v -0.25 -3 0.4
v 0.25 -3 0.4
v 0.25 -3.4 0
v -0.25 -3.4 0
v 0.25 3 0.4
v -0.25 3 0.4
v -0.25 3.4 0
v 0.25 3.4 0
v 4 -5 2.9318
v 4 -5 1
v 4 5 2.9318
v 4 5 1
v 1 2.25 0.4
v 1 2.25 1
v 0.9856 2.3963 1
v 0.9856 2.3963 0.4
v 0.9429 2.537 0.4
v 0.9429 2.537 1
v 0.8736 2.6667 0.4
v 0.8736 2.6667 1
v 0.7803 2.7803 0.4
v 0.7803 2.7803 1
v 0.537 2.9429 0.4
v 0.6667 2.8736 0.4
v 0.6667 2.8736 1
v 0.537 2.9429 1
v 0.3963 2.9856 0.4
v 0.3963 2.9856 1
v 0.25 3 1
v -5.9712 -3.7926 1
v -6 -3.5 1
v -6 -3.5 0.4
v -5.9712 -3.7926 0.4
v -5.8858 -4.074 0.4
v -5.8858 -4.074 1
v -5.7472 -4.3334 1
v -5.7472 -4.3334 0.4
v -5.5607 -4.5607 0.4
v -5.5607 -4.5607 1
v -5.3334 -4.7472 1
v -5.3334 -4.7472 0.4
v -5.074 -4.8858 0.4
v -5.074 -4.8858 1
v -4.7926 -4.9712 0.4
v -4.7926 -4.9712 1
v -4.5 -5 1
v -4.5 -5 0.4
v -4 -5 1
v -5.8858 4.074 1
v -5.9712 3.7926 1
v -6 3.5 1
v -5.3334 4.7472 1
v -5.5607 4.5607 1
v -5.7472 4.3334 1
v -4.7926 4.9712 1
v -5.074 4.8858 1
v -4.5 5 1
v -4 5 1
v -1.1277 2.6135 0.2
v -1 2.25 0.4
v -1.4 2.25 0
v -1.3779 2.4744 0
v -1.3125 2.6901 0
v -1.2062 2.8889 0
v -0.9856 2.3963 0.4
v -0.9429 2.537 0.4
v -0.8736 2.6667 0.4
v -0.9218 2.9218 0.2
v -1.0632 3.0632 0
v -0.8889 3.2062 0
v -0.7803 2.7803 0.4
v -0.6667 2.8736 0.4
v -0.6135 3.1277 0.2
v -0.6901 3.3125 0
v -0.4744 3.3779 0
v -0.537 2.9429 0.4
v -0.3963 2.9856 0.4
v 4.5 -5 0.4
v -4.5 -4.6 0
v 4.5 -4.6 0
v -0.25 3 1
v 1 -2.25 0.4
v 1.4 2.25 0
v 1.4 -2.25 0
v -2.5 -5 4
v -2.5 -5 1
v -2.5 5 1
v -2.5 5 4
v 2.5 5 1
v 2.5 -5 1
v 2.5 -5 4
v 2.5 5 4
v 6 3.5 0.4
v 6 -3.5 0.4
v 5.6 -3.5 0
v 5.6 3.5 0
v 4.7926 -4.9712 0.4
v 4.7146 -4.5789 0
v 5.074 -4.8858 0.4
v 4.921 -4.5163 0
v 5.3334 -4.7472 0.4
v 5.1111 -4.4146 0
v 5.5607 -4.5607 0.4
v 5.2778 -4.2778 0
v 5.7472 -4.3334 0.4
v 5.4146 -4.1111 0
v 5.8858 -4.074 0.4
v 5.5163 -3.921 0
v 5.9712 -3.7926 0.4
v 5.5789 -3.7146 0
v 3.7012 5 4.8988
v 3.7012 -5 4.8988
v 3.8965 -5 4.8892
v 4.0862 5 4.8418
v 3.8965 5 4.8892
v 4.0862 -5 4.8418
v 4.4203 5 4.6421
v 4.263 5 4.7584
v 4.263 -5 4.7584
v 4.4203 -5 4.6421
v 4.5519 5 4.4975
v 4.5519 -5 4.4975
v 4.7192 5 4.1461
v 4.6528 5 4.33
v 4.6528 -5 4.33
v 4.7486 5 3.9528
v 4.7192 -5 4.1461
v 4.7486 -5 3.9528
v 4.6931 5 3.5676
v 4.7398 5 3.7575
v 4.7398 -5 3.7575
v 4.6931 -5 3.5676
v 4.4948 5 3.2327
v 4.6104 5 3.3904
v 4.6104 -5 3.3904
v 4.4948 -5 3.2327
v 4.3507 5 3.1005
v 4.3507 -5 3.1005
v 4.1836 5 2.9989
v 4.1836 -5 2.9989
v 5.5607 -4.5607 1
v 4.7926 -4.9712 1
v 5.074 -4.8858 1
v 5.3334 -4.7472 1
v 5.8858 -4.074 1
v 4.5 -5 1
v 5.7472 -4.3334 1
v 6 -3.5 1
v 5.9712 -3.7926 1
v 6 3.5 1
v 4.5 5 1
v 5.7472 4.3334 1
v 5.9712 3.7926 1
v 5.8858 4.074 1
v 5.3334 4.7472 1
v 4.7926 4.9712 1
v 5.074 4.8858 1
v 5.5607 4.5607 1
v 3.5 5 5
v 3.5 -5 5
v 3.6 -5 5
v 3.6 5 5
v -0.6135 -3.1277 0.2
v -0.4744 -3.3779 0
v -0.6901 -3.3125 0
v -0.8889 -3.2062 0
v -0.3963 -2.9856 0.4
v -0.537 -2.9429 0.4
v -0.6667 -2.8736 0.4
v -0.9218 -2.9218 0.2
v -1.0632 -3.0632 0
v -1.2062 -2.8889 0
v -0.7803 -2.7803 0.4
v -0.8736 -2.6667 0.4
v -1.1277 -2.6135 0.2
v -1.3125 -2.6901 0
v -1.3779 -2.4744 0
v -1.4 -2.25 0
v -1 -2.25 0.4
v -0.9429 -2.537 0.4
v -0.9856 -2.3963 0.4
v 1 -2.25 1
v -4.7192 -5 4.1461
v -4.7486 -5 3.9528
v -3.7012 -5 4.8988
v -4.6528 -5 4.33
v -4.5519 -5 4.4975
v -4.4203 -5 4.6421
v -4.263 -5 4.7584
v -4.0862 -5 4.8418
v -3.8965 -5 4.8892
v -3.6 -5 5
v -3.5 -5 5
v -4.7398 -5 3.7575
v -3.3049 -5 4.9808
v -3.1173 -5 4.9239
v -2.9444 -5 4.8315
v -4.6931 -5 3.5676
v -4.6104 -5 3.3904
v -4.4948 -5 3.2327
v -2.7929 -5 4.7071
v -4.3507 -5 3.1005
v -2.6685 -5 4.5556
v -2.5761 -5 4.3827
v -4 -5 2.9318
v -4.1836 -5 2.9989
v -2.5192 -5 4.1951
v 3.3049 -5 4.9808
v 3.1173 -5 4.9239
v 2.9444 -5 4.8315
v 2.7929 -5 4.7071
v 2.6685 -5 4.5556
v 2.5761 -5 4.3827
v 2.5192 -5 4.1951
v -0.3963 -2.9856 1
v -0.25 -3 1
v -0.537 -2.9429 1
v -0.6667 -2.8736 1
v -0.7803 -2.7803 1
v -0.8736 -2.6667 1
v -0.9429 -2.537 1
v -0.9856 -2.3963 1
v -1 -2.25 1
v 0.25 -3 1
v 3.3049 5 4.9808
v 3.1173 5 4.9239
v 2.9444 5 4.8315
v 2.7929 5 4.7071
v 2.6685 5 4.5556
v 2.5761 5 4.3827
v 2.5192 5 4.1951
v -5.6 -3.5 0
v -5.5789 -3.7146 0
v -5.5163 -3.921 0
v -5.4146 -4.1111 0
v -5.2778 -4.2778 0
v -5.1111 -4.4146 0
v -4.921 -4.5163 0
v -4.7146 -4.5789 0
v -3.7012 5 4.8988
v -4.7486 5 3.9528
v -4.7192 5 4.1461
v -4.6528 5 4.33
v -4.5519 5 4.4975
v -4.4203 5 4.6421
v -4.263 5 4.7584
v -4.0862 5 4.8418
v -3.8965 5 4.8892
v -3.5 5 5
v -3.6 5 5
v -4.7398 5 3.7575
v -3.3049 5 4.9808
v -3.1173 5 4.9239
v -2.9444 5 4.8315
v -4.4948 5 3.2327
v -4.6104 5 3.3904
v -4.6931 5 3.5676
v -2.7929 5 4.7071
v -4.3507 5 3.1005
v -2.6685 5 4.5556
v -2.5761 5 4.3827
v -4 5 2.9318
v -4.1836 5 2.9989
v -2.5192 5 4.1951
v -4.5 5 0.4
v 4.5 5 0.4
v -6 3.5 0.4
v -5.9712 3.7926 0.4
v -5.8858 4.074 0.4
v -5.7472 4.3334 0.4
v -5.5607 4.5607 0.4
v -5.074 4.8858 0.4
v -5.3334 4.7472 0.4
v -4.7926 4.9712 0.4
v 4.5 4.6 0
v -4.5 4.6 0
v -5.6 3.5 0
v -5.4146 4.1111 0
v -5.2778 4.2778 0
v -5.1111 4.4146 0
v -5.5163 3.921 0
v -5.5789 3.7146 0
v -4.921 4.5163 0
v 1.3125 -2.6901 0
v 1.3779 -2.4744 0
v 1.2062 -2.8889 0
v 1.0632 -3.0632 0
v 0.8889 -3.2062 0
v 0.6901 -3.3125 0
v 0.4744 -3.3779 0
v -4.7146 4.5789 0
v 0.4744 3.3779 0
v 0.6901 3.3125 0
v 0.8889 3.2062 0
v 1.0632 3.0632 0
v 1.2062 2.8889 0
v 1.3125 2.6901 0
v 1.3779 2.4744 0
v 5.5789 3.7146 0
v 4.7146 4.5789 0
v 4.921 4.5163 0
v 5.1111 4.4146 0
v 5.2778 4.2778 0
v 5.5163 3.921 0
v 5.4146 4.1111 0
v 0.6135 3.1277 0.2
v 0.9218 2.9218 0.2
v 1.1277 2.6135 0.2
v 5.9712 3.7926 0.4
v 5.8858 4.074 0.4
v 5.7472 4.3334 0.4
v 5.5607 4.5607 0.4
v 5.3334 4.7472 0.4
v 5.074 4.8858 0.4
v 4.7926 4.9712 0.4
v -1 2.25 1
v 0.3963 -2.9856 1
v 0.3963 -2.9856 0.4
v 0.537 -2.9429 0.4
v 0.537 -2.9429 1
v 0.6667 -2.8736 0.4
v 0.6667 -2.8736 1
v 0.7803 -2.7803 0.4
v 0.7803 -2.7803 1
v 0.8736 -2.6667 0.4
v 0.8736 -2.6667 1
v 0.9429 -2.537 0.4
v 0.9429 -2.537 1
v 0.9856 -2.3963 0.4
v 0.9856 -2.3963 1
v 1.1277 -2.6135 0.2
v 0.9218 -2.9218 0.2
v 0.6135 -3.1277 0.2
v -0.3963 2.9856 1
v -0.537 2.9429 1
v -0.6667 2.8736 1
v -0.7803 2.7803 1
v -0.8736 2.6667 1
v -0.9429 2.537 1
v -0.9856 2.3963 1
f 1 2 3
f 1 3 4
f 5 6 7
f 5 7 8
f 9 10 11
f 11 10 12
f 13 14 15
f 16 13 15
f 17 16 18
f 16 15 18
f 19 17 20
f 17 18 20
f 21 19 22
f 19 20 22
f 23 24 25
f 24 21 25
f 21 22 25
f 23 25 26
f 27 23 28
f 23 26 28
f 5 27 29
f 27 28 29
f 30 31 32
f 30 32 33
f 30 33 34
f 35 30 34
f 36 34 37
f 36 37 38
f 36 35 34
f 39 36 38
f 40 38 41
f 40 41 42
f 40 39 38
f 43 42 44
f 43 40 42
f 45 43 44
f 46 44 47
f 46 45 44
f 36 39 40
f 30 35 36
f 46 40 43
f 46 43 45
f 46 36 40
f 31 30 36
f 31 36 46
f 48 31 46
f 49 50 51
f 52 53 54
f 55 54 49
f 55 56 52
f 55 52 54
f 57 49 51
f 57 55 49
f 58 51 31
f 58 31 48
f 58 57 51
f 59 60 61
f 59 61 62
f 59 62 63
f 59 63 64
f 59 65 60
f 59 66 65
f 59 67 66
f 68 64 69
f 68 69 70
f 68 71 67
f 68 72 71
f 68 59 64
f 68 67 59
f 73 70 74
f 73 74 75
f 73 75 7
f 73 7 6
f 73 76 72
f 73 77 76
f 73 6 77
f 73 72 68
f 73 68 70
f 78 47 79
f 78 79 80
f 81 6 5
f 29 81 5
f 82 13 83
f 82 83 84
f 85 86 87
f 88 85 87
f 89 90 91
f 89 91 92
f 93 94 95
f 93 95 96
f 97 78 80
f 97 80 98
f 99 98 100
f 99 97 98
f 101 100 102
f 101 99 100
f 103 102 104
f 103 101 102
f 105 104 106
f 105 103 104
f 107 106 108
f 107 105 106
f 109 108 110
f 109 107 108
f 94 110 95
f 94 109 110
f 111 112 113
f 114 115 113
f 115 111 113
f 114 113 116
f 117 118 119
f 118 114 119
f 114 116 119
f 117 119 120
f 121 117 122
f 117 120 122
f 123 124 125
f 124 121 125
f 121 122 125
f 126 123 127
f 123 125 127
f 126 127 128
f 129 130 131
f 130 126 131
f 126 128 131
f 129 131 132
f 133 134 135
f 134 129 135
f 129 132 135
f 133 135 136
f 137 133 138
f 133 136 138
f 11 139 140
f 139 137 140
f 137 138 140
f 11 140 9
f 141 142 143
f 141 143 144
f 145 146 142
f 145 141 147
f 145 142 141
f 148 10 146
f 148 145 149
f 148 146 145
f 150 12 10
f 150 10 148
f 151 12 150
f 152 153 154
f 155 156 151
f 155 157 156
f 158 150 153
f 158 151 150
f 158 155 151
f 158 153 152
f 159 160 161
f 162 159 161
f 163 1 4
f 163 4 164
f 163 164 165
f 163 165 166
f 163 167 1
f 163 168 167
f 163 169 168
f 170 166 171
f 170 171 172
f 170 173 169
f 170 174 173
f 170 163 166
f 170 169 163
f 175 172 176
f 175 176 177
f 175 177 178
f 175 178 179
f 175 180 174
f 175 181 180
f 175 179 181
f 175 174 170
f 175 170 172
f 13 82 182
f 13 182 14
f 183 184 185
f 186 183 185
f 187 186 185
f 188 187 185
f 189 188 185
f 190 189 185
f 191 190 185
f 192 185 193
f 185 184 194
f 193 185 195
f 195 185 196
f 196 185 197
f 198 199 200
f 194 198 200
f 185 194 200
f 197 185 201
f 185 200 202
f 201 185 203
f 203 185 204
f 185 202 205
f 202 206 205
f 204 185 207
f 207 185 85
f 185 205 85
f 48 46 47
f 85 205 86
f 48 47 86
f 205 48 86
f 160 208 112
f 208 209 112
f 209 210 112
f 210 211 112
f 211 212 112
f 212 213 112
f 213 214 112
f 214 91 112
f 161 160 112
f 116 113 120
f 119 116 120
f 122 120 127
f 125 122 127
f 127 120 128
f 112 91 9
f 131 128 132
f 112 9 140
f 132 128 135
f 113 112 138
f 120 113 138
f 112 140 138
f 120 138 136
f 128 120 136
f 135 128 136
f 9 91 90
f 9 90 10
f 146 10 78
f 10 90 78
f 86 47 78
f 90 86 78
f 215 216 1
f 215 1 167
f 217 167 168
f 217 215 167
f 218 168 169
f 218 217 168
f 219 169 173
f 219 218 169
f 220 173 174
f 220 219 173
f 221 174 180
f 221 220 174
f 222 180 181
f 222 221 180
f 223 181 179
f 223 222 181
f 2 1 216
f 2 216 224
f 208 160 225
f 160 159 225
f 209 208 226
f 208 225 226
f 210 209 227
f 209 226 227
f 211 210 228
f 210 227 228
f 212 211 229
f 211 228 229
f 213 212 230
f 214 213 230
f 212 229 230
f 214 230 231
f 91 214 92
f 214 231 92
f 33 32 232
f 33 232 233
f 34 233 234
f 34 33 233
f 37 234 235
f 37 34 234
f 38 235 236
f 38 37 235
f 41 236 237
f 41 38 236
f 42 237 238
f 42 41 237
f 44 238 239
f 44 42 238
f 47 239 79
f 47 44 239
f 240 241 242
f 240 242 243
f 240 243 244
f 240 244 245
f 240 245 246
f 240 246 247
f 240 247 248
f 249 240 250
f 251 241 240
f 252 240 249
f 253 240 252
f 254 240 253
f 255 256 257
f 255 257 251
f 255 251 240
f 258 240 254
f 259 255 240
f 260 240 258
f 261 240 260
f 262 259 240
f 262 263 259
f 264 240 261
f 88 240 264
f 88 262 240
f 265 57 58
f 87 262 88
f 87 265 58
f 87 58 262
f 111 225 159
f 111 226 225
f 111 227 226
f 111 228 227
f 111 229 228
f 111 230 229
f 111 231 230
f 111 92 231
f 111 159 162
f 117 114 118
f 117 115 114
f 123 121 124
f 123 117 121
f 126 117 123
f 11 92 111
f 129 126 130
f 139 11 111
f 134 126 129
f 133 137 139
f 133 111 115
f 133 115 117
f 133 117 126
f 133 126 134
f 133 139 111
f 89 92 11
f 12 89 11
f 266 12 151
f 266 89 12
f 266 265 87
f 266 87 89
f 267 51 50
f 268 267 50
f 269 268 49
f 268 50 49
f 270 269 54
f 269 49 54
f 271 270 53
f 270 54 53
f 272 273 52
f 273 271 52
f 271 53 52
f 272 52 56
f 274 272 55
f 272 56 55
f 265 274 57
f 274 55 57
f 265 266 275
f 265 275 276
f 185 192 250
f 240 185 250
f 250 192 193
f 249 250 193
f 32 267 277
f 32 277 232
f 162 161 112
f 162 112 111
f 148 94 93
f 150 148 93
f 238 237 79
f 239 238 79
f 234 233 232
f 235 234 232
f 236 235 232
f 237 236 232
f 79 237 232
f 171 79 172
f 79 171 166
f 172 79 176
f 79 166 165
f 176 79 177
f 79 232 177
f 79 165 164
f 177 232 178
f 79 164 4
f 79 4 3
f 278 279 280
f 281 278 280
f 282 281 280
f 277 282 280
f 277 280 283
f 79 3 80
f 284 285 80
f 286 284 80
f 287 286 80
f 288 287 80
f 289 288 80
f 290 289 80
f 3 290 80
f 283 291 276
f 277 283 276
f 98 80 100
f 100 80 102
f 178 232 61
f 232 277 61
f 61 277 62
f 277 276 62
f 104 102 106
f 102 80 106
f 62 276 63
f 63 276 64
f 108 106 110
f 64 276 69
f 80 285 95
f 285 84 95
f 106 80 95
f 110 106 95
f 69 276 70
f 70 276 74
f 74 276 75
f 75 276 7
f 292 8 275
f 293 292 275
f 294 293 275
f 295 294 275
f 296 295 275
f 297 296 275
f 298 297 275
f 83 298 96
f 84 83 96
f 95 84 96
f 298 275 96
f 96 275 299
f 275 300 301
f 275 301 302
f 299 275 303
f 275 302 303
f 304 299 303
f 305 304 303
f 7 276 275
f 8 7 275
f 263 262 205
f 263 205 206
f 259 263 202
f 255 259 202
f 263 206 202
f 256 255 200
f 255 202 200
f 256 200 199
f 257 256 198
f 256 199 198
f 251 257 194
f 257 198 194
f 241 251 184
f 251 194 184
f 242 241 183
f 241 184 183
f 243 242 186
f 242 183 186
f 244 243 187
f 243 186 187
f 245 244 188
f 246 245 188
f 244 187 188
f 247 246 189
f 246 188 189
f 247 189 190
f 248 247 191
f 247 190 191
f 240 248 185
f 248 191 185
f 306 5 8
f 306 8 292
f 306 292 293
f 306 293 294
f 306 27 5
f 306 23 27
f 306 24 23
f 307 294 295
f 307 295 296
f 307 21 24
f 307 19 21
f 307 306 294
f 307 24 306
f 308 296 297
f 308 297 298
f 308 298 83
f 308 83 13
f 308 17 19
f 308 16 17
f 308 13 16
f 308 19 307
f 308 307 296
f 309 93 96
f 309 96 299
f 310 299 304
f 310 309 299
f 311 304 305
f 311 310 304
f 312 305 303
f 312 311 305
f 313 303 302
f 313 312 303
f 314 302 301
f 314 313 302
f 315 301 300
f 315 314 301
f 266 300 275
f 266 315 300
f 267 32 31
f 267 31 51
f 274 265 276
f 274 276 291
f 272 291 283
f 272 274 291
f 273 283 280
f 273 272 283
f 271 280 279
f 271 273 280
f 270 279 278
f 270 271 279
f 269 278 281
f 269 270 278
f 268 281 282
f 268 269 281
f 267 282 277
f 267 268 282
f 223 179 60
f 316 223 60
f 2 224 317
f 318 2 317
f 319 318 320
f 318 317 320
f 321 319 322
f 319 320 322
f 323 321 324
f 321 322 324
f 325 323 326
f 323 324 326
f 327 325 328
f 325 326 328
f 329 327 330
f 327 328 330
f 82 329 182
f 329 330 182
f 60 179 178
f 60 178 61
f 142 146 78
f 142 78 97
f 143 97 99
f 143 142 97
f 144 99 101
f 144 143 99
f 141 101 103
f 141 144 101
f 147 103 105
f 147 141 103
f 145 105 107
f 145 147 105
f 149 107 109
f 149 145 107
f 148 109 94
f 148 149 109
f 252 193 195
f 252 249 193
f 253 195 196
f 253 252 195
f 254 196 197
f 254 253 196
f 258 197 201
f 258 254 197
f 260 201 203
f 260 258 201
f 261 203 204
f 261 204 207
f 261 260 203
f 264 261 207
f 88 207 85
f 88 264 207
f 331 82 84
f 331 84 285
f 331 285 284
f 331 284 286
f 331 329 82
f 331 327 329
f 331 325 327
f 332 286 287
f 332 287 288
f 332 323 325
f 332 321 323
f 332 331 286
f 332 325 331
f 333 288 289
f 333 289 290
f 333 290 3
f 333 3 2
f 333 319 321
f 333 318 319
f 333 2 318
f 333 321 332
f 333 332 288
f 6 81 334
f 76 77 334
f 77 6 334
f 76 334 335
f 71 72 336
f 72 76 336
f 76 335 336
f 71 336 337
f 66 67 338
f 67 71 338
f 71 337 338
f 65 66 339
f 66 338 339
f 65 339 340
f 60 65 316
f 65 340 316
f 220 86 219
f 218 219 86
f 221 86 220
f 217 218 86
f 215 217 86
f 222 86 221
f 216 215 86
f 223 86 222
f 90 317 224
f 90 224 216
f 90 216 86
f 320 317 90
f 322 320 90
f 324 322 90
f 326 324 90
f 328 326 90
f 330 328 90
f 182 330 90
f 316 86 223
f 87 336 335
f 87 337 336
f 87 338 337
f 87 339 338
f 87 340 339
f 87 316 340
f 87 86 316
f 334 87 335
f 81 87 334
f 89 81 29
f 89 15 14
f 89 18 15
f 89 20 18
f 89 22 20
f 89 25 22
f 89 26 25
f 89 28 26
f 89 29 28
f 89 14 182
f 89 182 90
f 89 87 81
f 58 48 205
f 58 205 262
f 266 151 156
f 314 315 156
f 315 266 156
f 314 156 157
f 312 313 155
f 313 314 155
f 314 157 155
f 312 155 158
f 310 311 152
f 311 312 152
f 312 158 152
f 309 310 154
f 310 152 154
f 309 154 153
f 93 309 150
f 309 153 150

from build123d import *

# Parameters (mm, degrees)
BOX010_W                    = 2
BOX010_H                    = 6
BOX010_DEPTH                = 10
BOX008_W                    = 1.5
BOX008_H                    = 10
BOX008_DEPTH                = 5
CHAMFER004001002001005_SIZE = 0.4
CYLINDER004_R               = 1
CYLINDER004_DEPTH           = 10
CYLINDER003_R               = 1
CYLINDER003_DEPTH           = 10
BOX007_W                    = 12
BOX007_H                    = 10
BOX007_DEPTH                = 1
BOX009_W                    = 1.5
BOX009_H                    = 10
BOX009_DEPTH                = 5
CHAMFER004001002001006_SIZE = 0.4
FILLET_R                    = 0.75
FILLET001_R                 = 1.5
CHAMFER004001002001007_SIZE = 0.4
FILLET002_R                 = 1


with BuildPart() as cube010:
    # Box010 → Box010 (new body)
    with BuildSketch(Plane(origin=(-1, -3, 0), x_dir=(1, 0, 0), z_dir=(0, 0, 1))):
        with Locations((1, 3)):
            Rectangle(BOX010_W, BOX010_H)
    extrude(amount=BOX010_DEPTH)


with BuildPart() as chamfer004001002001005:
    # Box008 → Box008 (new body)
    with BuildSketch(Plane(origin=(-4, -5, 0), x_dir=(1, 0, 0), z_dir=(0, 0, 1))):
        with Locations((0.75, 5)):
            Rectangle(BOX008_W, BOX008_H)
    extrude(amount=BOX008_DEPTH)

    # Chamfer004001002001005
    chamfer004001002001005_edges = [chamfer004001002001005.edges().sort_by_distance(p)[0] for p in [
        (-4, 0, 5),
    ]]
    chamfer(chamfer004001002001005_edges, length=CHAMFER004001002001005_SIZE)


with BuildPart() as cylinder004:
    # Cylinder004 → Cylinder004 (new body)
    with BuildSketch(Plane(origin=(3.75, -5, 3.9), x_dir=(1, 0, 0), z_dir=(0, 1, 0))):
        Circle(CYLINDER004_R)
    extrude(amount=CYLINDER004_DEPTH)


with BuildPart() as cylinder003:
    # Cylinder003 → Cylinder003 (new body)
    with BuildSketch(Plane(origin=(-3.75, -5, 3.9), x_dir=(1, 0, 0), z_dir=(0, 1, 0))):
        Circle(CYLINDER003_R)
    extrude(amount=CYLINDER003_DEPTH)


with BuildPart() as cube007:
    # Box007 → Box007 (new body)
    with BuildSketch(Plane(origin=(-6, -5, 0), x_dir=(1, 0, 0), z_dir=(0, 0, 1))):
        with Locations((6, 5)):
            Rectangle(BOX007_W, BOX007_H)
    extrude(amount=BOX007_DEPTH)


with BuildPart() as cable_clip:
    # Box009 → Box009 (new body)
    with BuildSketch(Plane(origin=(2.5, -5, 0), x_dir=(1, 0, 0), z_dir=(0, 0, 1))):
        with Locations((0.75, 5)):
            Rectangle(BOX009_W, BOX009_H)
    extrude(amount=BOX009_DEPTH)

    # Chamfer004001002001006
    chamfer004001002001006_edges = [cable_clip.edges().sort_by_distance(p)[0] for p in [
        (4, 0, 5),
    ]]
    chamfer(chamfer004001002001006_edges, length=CHAMFER004001002001006_SIZE)

    # Fusion002: union Chamfer004001002001005, Cylinder004, Cylinder003, Cube007
    add(chamfer004001002001005.part)
    add(cylinder004.part)
    add(cylinder003.part)
    add(cube007.part)

    # Cut002008023012009006003002007003001002002: cut Cube010
    add(cube010.part, mode=Mode.SUBTRACT)

    # Fillet
    fillet_edges = [cable_clip.edges().sort_by_distance(p)[0] for p in [
        (1, -3, 0.5),
        (-1, -3, 0.5),
        (1, 3, 0.5),
        (-1, 3, 0.5),
    ]]
    fillet(fillet_edges, radius=FILLET_R)

    # Fillet001
    fillet001_edges = [cable_clip.edges().sort_by_distance(p)[0] for p in [
        (6, 5, 0.5),
        (-6, 5, 0.5),
        (6, -5, 0.5),
        (-6, -5, 0.5),
    ]]
    fillet(fillet001_edges, radius=FILLET001_R)

    # Chamfer004001002001007
    chamfer004001002001007_edges = [cable_clip.edges().sort_by_distance(p)[0] for p in [
        (4.25, -5, 0),
        (5.56066, -4.56066, 0),
        (6, 0, 0),
        (5.56066, 4.56066, 0),
        (3.25, 5, 0),
        (3.25, -5, 0),
        (0, 5, 0),
        (-1, 0, 0),
        (-0.78033, 2.78033, 0),
        (0, 3, 0),
        (0.78033, 2.78033, 0),
        (1, 0, 0),
        (0.78033, -2.78033, 0),
        (0, -3, 0),
        (-0.78033, -2.78033, 0),
        (0, -5, 0),
        (-3.25, 5, 0),
        (-3.25, -5, 0),
        (-4.25, 5, 0),
        (-5.56066, 4.56066, 0),
        (-6, 0, 0),
        (-5.56066, -4.56066, 0),
        (-4.25, -5, 0),
    ]]
    chamfer(chamfer004001002001007_edges, length=CHAMFER004001002001007_SIZE)

    # Fillet002
    fillet002_edges = [cable_clip.edges().sort_by_distance(p)[0] for p in [
        (2.5, 0, 5),
        (-2.5, 0, 5),
    ]]
    fillet(fillet002_edges, radius=FILLET002_R)


solid = cable_clip.part
